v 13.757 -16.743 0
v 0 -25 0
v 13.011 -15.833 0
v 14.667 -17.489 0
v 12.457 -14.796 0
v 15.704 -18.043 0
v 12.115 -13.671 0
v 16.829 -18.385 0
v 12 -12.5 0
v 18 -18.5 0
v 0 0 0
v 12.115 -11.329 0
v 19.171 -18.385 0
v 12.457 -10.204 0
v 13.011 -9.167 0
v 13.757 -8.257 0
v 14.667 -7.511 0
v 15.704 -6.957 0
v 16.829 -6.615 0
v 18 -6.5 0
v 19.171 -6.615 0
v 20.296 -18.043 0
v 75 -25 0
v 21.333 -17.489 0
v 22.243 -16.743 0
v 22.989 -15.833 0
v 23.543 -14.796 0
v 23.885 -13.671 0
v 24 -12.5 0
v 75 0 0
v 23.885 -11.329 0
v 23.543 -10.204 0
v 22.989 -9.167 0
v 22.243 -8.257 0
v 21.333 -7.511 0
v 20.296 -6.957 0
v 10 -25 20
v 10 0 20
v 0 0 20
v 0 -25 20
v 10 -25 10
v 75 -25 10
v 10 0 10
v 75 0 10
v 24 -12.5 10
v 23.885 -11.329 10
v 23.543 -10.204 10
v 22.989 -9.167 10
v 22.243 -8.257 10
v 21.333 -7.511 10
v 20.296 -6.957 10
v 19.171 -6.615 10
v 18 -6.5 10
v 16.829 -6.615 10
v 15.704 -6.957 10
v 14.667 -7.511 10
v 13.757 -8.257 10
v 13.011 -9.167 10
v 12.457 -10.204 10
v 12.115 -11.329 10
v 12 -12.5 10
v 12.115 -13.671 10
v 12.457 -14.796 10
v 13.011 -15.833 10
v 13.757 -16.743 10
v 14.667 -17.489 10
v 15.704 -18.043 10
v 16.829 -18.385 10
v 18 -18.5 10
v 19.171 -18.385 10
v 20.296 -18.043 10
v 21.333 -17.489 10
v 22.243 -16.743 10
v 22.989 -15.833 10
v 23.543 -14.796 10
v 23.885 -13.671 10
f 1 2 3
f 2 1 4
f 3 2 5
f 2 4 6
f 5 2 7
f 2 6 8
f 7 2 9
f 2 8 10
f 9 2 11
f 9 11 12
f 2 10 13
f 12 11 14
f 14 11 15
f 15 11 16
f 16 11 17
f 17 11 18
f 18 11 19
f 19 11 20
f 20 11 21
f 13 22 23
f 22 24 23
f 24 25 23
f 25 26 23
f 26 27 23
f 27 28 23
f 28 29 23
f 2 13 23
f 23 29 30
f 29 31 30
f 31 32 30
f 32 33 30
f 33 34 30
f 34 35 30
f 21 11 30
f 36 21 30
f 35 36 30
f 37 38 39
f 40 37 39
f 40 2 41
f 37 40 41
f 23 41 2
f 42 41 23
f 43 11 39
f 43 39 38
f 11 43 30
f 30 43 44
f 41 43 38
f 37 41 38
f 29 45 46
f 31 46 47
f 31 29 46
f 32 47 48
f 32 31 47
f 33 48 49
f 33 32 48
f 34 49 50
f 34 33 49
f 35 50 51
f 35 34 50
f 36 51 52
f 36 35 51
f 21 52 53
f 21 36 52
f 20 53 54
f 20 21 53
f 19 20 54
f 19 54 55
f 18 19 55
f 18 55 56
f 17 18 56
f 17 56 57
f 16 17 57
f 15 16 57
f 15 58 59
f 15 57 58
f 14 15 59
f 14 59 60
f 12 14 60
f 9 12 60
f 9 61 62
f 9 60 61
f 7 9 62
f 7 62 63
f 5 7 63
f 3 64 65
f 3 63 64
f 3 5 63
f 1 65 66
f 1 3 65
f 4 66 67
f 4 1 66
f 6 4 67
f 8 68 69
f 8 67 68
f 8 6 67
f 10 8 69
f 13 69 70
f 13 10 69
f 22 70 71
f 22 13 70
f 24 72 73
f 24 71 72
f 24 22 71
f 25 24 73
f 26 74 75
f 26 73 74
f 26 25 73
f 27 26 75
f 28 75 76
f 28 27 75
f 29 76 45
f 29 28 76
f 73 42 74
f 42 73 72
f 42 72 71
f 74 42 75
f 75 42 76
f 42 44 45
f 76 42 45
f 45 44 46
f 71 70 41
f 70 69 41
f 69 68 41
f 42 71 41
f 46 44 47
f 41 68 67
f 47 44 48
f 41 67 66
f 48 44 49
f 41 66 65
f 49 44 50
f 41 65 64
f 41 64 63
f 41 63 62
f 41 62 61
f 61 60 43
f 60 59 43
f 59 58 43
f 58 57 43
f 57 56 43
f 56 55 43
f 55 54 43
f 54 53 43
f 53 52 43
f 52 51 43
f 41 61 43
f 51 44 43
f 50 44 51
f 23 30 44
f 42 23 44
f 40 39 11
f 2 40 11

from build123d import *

# Parameters (mm, degrees)
F1_DEPTH = 25
F2_R     = 6
F3_DEPTH = 20.001


with BuildPart() as f1:
    # F0 (on Front) → F1 (new body)
    with BuildSketch(Plane.XZ):
        Polygon((0, 20), (0, 0), (75, 0), (75, 10), (10, 10), (10, 20), align=None)
    extrude(amount=F1_DEPTH)

    # F2 (on Top) → F3 (cut, through all)
    with BuildSketch(Plane.XY):
        with Locations((18, -12.5)):
            Circle(F2_R)
    extrude(amount=F3_DEPTH, mode=Mode.SUBTRACT)


solid = f1.part
